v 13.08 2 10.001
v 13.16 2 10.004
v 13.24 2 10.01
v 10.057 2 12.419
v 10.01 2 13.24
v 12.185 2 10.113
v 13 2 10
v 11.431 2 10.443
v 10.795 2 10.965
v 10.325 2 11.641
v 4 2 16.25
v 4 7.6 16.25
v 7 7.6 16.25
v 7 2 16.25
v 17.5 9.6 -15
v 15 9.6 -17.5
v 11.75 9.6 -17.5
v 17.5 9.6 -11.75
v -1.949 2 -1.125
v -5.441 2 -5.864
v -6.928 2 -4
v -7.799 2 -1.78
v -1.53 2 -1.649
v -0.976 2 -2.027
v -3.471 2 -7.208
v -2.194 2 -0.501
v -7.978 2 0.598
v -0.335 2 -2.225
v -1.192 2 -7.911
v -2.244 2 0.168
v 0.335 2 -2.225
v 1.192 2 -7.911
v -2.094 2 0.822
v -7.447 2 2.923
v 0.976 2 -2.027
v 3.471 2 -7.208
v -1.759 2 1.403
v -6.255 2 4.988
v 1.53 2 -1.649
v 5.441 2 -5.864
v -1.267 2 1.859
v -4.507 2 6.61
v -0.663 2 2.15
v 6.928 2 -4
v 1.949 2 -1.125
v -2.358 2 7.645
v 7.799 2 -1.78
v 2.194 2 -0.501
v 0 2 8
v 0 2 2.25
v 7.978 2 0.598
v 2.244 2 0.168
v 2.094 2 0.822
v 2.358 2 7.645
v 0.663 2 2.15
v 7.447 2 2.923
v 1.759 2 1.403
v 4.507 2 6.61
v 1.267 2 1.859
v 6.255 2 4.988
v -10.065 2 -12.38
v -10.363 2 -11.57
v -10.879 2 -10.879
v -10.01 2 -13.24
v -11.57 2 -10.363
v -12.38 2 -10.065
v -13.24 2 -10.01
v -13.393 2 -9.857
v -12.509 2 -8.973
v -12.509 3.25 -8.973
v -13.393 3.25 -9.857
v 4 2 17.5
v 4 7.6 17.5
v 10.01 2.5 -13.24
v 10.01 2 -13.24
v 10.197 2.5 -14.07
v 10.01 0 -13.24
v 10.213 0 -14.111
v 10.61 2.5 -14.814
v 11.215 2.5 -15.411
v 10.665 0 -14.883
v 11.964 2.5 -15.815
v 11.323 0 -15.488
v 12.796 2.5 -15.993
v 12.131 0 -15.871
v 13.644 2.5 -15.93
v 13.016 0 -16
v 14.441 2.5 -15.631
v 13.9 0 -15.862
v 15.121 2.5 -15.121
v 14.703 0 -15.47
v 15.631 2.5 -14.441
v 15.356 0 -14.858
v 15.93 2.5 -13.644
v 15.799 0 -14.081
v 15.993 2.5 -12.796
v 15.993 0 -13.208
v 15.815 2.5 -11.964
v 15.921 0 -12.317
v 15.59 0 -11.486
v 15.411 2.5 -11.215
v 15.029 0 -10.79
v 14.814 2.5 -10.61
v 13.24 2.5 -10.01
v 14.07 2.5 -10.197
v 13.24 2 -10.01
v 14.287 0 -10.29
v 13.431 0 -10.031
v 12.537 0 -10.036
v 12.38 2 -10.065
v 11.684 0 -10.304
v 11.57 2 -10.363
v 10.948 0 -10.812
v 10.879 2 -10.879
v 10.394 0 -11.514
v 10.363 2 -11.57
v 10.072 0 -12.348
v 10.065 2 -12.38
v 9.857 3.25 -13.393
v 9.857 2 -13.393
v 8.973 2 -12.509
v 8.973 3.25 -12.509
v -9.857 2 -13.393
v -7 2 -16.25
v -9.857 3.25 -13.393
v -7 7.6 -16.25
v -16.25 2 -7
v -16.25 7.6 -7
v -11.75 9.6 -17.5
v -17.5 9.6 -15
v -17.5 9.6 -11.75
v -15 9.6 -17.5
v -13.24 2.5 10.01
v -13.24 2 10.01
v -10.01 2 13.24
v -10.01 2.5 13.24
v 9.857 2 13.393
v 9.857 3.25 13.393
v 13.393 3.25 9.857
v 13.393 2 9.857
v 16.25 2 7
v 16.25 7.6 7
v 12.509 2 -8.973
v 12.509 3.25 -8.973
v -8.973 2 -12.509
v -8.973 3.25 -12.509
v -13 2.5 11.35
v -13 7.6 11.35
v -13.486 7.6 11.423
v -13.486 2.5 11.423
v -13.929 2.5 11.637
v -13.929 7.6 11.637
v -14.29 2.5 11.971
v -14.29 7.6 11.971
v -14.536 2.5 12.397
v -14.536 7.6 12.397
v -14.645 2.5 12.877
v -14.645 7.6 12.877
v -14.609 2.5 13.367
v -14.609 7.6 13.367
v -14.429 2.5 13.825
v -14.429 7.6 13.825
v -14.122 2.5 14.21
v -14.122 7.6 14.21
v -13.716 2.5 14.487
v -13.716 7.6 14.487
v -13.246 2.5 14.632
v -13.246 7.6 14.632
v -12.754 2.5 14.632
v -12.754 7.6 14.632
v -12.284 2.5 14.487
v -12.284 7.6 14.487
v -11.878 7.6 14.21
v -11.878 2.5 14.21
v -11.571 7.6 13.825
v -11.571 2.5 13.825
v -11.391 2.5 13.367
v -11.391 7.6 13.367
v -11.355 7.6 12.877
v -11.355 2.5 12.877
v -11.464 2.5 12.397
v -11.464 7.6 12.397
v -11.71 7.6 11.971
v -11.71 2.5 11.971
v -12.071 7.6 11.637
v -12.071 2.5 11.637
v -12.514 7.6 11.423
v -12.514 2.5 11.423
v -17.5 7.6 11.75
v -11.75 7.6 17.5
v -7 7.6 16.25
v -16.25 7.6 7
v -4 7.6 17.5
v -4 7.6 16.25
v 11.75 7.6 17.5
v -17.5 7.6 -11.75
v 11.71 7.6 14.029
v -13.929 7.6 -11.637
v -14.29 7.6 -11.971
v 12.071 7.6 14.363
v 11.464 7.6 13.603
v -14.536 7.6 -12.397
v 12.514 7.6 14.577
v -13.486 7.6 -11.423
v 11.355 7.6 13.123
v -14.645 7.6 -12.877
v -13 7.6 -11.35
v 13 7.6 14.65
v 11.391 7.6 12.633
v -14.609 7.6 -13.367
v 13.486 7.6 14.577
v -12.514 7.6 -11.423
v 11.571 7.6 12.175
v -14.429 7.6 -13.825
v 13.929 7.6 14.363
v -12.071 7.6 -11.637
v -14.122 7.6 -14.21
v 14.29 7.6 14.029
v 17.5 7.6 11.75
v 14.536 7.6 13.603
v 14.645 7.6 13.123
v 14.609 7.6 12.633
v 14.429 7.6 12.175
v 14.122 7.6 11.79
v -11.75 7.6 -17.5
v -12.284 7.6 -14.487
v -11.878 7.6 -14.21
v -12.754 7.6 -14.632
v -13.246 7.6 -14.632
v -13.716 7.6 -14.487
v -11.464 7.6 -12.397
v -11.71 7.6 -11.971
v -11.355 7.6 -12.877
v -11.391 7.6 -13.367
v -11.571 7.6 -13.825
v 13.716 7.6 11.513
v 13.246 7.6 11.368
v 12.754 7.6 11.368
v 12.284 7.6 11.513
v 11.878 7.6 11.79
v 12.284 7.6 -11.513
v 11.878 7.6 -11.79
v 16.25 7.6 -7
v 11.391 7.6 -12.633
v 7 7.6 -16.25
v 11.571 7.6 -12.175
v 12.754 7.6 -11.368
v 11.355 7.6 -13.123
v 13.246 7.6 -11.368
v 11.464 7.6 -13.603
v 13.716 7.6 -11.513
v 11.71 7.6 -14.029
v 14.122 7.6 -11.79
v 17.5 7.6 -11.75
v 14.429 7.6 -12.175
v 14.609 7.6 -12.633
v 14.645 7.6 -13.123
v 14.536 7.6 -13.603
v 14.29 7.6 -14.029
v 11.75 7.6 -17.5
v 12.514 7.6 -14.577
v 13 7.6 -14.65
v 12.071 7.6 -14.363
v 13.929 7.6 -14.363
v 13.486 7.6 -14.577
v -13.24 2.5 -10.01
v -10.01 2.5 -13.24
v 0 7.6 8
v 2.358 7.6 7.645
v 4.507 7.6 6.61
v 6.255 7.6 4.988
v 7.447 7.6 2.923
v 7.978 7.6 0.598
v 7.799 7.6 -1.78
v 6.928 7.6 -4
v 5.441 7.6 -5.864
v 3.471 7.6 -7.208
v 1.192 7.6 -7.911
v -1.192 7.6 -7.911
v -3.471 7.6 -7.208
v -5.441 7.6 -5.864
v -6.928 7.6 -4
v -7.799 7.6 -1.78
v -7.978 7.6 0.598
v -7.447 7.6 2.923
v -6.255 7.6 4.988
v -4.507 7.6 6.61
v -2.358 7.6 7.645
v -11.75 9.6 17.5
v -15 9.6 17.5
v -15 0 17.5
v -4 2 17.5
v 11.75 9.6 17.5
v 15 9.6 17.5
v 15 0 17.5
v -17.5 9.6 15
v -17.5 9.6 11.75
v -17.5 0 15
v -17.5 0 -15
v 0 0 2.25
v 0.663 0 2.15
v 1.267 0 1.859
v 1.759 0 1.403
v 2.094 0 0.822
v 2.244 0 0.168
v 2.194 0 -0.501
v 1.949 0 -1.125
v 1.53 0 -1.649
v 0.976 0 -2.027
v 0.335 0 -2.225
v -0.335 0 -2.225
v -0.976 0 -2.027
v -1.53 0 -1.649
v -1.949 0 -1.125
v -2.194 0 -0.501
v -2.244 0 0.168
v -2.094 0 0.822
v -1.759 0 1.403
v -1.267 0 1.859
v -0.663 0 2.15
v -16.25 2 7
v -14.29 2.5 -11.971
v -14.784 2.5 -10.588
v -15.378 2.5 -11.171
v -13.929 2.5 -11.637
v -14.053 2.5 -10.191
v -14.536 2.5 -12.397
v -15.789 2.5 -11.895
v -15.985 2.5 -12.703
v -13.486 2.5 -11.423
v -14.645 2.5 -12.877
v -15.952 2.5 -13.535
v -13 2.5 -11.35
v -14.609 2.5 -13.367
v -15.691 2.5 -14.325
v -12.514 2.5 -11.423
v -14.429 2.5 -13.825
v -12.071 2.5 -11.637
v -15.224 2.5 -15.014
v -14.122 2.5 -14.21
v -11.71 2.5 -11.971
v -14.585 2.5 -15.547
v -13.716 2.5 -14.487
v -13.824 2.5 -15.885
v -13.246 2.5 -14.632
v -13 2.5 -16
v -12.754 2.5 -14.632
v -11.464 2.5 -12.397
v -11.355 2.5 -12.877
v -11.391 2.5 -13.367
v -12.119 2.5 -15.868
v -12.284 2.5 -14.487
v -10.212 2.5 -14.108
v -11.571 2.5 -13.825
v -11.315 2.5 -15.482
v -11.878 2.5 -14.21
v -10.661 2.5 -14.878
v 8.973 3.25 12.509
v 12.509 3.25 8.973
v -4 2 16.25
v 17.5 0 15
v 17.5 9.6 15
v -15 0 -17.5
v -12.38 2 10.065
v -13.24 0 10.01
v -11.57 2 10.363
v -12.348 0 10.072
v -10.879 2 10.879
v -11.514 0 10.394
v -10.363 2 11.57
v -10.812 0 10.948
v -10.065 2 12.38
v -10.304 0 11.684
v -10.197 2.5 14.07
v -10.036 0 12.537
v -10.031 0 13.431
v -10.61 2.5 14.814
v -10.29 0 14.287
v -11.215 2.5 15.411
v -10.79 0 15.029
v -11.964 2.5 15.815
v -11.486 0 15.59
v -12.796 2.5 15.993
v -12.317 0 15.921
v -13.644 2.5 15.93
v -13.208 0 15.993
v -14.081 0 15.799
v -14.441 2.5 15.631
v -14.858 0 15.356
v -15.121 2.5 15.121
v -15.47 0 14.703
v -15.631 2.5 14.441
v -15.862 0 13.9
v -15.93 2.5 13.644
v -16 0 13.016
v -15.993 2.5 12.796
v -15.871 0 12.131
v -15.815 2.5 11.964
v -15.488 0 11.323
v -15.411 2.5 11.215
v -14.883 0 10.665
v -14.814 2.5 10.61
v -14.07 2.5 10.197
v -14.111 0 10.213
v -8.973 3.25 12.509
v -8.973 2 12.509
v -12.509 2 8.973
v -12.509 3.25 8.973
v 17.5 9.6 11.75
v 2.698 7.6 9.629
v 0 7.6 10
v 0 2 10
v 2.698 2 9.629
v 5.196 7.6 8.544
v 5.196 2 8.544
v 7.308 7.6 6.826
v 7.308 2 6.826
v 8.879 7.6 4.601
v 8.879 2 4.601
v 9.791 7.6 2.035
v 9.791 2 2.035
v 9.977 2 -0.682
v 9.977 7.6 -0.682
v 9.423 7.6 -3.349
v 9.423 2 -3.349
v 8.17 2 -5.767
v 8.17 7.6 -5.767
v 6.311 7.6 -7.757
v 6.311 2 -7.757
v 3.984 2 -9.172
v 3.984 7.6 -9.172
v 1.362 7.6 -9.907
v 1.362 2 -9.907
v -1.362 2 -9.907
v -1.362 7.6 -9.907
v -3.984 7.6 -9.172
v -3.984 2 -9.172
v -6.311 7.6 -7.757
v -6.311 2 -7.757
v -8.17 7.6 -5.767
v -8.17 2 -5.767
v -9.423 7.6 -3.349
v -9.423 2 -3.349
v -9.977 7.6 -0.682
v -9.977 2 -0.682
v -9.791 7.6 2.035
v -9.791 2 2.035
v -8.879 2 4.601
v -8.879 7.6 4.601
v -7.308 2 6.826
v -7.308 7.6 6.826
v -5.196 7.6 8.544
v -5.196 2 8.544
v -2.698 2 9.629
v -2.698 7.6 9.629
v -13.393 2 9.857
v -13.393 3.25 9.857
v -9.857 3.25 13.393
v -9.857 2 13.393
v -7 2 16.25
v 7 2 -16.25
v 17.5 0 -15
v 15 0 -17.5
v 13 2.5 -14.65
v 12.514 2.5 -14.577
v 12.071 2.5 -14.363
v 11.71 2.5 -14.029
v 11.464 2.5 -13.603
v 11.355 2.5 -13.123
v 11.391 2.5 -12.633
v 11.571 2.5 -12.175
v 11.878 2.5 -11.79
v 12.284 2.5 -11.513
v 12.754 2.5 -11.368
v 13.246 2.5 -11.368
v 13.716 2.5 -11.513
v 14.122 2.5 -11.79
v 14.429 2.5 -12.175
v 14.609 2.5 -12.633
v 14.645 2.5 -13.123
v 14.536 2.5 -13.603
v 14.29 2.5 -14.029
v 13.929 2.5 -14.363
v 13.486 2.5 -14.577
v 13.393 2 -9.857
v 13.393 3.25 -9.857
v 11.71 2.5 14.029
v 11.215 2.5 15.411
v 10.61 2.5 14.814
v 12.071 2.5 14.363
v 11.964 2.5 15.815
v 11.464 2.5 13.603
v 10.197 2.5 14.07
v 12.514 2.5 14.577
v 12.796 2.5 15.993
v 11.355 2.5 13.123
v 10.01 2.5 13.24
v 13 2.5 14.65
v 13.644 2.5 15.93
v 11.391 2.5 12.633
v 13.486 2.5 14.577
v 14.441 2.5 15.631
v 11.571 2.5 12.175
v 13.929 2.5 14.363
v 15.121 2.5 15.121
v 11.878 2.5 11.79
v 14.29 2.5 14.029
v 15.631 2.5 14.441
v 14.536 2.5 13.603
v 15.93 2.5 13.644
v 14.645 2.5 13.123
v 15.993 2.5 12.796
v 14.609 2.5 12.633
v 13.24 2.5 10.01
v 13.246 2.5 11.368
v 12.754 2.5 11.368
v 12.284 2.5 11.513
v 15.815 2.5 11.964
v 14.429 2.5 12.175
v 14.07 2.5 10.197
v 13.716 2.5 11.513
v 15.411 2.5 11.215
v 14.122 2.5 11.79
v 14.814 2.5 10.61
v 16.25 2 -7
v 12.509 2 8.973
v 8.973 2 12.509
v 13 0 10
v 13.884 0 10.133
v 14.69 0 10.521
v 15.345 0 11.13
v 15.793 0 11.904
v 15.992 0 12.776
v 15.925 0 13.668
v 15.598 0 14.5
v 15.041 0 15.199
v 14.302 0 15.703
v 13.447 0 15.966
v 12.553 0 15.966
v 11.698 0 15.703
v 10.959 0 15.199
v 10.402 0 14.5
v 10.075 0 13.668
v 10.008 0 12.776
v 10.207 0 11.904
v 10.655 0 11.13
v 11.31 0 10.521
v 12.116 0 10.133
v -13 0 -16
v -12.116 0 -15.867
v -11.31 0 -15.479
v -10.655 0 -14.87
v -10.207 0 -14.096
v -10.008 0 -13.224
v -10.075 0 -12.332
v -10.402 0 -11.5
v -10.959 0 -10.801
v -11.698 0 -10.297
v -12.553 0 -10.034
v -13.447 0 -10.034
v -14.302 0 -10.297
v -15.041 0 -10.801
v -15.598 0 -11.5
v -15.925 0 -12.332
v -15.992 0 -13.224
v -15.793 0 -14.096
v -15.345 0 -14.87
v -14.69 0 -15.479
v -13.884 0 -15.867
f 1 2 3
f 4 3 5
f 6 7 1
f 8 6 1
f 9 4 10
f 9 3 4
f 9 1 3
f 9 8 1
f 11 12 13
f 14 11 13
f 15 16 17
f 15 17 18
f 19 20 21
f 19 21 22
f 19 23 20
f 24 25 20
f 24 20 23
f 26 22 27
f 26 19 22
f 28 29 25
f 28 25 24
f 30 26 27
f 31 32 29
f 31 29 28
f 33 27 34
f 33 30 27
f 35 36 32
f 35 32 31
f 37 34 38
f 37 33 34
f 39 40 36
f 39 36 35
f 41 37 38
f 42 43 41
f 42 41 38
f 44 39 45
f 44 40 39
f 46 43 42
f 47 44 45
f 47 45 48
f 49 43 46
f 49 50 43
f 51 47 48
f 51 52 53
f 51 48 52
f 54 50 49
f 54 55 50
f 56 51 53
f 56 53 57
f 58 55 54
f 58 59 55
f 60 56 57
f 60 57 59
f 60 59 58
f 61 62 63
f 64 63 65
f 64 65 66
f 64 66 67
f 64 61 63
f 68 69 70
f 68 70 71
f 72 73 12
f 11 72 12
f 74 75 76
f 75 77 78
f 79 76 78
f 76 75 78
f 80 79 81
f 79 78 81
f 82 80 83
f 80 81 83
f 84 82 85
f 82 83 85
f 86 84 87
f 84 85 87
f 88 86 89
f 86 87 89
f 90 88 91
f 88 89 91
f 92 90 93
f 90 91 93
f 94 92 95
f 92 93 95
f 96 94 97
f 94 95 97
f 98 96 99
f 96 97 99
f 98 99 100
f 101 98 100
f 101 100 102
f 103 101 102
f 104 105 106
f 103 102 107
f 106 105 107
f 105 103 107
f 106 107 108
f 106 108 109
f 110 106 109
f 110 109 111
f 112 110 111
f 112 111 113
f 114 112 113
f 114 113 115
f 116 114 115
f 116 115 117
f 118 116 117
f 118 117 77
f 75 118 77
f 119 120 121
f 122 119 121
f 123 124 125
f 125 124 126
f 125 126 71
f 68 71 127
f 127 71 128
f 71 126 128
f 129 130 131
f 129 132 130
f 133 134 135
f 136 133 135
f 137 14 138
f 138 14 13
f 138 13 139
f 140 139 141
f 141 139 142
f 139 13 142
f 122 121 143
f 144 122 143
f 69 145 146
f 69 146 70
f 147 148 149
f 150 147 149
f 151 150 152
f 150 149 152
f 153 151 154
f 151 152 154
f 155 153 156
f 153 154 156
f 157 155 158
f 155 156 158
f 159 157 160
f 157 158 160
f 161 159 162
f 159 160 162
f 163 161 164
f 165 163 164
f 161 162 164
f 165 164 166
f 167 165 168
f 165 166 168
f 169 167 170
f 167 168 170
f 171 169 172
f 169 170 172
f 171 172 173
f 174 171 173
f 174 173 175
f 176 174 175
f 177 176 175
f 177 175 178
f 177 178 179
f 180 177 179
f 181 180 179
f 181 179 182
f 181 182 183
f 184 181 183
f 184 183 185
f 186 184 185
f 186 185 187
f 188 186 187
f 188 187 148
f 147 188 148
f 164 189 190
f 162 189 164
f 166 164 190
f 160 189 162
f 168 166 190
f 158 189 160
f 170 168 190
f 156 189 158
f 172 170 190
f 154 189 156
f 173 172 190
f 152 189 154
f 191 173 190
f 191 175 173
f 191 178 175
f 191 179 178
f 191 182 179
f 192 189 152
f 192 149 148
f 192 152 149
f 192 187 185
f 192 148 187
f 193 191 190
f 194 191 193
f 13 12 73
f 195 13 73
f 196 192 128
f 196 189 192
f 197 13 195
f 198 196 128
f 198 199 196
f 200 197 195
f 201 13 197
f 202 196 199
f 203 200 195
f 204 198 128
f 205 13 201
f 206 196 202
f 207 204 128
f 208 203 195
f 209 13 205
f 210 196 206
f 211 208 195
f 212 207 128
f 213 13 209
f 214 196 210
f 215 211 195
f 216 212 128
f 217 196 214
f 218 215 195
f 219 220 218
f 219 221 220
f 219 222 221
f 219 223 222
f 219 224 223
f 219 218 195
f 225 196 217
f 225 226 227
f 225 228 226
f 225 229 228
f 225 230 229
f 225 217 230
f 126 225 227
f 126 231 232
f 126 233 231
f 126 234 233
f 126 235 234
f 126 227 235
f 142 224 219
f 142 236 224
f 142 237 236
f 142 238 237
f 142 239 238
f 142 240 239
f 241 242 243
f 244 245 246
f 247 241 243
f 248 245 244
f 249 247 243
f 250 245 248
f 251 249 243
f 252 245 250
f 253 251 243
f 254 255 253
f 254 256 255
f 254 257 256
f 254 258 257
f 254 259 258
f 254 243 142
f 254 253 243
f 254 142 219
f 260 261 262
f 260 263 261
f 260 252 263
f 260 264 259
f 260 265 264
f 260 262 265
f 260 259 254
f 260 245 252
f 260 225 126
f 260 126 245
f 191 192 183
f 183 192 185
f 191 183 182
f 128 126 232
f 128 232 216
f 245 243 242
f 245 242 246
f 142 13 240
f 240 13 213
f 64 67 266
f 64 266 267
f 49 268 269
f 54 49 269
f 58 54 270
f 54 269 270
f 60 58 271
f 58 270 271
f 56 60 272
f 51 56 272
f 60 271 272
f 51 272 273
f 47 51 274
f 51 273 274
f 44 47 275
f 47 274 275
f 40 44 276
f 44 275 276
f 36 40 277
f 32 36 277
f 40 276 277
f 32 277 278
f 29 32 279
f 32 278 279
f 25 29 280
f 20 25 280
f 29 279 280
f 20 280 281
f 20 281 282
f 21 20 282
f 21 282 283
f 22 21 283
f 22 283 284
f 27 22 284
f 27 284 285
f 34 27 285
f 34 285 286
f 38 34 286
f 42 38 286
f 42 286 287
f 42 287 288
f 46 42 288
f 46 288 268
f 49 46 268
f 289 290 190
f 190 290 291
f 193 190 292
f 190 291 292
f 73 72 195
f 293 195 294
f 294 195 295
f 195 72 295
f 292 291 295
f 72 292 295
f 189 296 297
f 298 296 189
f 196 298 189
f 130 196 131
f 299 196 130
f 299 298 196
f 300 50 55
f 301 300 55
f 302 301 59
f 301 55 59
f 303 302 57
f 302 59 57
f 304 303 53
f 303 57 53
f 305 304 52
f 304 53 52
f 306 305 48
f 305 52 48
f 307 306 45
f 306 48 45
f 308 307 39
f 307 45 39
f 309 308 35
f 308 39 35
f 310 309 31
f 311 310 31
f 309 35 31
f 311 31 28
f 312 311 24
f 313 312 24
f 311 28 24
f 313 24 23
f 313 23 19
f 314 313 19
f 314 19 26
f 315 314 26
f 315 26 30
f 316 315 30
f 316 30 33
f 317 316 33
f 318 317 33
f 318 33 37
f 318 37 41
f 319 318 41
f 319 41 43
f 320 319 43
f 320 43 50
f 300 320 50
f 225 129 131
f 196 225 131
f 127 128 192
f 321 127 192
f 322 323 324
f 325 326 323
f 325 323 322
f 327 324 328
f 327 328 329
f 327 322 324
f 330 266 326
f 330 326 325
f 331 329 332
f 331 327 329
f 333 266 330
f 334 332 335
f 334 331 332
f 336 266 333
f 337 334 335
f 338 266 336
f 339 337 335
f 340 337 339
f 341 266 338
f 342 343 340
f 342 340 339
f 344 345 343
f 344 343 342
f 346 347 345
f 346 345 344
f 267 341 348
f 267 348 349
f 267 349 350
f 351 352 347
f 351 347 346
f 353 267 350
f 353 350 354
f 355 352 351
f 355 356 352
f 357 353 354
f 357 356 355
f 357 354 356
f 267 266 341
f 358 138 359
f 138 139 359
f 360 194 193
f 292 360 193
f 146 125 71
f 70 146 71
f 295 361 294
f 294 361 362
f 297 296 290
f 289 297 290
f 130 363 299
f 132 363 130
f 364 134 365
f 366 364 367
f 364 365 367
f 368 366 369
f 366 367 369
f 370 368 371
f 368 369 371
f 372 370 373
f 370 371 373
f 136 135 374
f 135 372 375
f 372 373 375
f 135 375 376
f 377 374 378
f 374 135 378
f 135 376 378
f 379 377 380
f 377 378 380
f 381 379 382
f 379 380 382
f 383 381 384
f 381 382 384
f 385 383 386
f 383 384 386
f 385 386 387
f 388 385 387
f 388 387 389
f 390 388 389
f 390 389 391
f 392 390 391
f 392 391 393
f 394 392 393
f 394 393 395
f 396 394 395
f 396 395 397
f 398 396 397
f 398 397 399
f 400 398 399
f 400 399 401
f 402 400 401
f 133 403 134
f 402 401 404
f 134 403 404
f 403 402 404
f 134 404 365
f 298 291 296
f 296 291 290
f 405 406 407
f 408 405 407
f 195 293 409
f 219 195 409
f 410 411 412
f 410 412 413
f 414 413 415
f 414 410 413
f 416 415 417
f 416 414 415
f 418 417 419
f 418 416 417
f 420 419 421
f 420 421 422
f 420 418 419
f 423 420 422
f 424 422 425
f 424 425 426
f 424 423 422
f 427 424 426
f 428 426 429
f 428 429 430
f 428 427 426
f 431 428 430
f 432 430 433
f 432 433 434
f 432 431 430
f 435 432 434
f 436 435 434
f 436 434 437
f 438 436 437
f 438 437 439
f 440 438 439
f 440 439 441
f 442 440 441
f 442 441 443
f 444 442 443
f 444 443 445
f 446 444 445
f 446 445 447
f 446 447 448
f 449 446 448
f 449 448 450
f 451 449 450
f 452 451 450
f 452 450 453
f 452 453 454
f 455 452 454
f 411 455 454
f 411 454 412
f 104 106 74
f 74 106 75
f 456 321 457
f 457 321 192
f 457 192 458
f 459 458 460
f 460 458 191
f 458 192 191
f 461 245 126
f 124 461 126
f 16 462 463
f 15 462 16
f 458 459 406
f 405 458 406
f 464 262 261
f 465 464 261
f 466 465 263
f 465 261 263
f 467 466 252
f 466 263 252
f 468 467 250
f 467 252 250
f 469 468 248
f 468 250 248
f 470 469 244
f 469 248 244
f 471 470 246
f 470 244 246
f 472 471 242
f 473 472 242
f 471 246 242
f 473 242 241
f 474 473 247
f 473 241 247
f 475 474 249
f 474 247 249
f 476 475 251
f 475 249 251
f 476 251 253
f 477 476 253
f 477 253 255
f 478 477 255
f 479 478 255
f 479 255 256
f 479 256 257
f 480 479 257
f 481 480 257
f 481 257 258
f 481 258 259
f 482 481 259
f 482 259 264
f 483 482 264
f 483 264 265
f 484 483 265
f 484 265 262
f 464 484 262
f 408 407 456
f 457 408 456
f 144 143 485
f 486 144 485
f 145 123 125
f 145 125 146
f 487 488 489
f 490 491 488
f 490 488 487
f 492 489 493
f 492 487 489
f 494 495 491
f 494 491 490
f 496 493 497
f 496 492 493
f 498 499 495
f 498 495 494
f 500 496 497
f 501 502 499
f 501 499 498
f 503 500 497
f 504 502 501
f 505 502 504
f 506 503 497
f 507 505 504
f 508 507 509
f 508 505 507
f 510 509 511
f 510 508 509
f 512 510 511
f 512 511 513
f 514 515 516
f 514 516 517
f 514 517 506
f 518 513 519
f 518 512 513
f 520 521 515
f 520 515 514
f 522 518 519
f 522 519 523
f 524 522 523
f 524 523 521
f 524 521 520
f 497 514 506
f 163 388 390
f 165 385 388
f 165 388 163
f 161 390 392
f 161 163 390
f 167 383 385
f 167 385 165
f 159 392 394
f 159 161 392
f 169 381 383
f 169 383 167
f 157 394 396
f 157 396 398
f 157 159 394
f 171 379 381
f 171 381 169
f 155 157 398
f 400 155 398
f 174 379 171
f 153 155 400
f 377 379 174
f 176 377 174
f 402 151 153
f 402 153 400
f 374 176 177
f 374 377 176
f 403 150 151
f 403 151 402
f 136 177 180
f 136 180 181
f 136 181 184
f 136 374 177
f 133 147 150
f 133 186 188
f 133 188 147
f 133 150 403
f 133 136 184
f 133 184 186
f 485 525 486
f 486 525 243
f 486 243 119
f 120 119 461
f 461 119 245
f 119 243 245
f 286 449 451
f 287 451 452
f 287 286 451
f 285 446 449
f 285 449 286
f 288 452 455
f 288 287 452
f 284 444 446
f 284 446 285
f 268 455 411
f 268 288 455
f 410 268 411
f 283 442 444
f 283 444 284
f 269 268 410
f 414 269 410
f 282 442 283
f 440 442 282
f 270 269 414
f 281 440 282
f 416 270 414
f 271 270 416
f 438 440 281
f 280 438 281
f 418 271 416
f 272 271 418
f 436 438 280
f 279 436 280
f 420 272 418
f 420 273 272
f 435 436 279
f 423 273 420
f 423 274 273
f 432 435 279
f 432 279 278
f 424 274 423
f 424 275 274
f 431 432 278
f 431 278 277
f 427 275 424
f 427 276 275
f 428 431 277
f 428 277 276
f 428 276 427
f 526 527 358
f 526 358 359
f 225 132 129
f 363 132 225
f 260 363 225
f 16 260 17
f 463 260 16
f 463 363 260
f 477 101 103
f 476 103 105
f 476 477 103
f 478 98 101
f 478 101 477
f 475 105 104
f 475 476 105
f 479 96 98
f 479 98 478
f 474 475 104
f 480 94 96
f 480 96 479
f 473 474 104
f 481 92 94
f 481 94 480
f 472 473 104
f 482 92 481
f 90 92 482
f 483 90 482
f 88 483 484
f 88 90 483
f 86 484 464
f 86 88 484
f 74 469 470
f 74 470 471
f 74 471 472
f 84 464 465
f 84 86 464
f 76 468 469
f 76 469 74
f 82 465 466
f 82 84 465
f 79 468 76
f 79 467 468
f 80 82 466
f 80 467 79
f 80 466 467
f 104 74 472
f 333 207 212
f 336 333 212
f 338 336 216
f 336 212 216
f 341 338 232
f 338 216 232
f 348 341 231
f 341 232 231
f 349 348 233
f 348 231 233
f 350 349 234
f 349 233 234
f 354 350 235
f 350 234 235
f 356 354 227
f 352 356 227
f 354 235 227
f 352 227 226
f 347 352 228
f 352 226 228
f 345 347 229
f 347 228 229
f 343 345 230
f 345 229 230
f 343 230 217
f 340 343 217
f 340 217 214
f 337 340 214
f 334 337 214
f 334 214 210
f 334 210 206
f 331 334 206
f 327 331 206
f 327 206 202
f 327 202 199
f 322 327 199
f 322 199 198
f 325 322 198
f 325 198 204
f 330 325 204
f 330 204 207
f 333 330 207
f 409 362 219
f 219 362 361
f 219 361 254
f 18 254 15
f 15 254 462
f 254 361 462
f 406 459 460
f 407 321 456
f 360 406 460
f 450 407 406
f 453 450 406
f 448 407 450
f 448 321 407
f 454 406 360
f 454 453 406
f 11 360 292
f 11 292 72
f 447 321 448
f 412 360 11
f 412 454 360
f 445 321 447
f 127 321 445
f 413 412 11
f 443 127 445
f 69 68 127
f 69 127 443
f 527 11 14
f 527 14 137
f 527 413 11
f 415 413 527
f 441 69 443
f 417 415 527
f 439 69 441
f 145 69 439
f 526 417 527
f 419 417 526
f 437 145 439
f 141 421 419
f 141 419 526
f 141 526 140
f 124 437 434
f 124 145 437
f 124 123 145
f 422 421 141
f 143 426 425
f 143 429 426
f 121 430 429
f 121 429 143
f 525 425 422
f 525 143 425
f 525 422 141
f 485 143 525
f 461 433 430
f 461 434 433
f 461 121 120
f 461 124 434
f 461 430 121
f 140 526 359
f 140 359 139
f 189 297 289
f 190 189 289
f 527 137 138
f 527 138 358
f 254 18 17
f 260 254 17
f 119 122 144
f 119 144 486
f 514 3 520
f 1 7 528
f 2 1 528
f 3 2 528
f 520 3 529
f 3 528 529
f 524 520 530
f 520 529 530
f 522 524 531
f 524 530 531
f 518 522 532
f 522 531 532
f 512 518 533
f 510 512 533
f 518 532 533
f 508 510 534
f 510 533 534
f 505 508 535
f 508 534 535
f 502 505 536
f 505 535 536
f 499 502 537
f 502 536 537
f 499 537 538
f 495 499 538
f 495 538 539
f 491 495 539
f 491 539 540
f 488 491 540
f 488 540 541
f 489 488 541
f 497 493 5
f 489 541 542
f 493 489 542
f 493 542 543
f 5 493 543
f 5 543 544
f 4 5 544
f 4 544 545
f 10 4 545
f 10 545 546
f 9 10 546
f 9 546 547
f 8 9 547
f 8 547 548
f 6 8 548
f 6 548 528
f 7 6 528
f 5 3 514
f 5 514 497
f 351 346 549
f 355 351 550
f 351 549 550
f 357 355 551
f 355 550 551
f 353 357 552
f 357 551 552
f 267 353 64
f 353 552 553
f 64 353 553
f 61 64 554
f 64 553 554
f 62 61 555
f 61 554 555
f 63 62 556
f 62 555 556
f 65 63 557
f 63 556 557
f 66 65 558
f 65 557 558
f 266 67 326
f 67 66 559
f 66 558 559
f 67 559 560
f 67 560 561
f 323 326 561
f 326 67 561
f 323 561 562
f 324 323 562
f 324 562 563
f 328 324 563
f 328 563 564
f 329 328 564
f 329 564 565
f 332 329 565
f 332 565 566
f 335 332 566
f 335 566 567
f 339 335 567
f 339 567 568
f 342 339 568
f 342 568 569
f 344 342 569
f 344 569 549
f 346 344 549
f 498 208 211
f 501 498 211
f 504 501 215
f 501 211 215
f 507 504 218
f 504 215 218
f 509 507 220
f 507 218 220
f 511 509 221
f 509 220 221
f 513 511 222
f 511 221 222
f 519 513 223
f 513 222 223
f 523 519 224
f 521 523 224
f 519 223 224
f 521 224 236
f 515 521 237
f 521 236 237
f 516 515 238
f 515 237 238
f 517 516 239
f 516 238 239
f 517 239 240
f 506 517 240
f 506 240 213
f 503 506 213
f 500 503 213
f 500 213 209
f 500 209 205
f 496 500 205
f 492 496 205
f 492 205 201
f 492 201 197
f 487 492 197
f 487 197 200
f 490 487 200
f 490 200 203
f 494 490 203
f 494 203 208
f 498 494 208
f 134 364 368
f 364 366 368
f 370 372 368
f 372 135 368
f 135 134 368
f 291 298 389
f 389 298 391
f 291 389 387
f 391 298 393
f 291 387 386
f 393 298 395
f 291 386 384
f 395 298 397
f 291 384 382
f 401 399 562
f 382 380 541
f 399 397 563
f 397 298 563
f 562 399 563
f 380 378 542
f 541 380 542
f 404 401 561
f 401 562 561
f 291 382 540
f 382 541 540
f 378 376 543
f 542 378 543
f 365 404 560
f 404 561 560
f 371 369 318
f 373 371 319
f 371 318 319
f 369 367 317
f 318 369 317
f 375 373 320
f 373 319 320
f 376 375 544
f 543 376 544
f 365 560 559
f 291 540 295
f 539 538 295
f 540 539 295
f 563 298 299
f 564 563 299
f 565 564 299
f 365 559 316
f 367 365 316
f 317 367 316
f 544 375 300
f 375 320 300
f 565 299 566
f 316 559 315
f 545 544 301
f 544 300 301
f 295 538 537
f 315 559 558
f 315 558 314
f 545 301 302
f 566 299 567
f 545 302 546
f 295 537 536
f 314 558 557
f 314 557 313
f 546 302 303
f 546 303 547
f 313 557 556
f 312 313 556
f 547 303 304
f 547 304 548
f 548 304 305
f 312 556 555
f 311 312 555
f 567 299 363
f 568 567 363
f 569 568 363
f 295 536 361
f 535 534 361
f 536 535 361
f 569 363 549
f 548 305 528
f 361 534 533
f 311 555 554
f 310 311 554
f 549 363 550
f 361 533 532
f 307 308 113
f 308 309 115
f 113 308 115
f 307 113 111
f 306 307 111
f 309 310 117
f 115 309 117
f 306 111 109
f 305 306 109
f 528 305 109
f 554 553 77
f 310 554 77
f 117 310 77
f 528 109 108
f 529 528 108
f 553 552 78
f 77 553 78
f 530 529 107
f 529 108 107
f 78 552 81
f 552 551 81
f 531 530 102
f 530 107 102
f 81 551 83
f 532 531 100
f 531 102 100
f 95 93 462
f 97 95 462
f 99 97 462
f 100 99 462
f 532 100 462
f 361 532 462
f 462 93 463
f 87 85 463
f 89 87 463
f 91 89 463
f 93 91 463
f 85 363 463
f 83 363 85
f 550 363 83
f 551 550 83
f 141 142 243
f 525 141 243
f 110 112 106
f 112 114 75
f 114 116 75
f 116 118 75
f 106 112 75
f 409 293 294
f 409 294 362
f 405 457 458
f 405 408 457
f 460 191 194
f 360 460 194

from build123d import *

# Parameters (mm, degrees)
SKETCH1_W           = 35
SKETCH1_H           = 35
BOSS_EXTRUDE1_DEPTH = 9.6
SKETCH2_R           = 10
SKETCH2_R_2         = 8
CUT_EXTRUDE1_DEPTH  = 7.6
CUT_EXTRUDE2_DEPTH  = 2
CHAMFER1_SIZE       = 2.5
SKETCH4_R           = 1.65
SKETCH4_R_2         = 2.25
CUT_EXTRUDE3_DEPTH  = 26.889380062
SKETCH5_R           = 3
CUT_EXTRUDE4_DEPTH  = 2.5
BOSS_EXTRUDE3_DEPTH = 1.25


with BuildPart() as part:
    # Sketch1 → Boss-Extrude1 (new body)
    with BuildSketch(Plane(origin=(0, 0, 0), x_dir=(1, 0, 0), z_dir=(0, 1, 0))):
        Rectangle(SKETCH1_W, SKETCH1_H)
    extrude(amount=BOSS_EXTRUDE1_DEPTH)

    # Sketch2 → Cut-Extrude1 (cut)
    # profile 1 of 2: a face of its own
    with BuildSketch(Plane(origin=(0, 9.6, 0), x_dir=(1, 0, 0), z_dir=(0, 1, 0))):
        Polygon((16.25, 7), (7, 16.25), (-7, 16.25), (-16.25, 7), (-16.25, -7), (-7, -16.25), (-4, -16.25), (-4, -17.5), (4, -17.5), (4, -16.25), (7, -16.25), (16.25, -7), align=None)
        with Locations(Location((0, 0, 0), (0, 0, 270))):
            Circle(SKETCH2_R, mode=Mode.SUBTRACT)
    # profile 2 of 2: a face of its own
    with BuildSketch(Plane(origin=(0, 9.6, 0), x_dir=(1, 0, 0), z_dir=(0, 1, 0))):
        with Locations(Location((0, 0, 0), (0, 0, 270))):
            Circle(SKETCH2_R_2)
    extrude(amount=-CUT_EXTRUDE1_DEPTH, mode=Mode.SUBTRACT)

    # Sketch3 → Cut-Extrude2 (cut)
    with BuildSketch(Plane(origin=(0, 9.6, 0), x_dir=(1, 0, 0), z_dir=(0, 1, 0))):
        Polygon((11.75, 17.5), (-11.75, 17.5), (-17.5, 11.75), (-17.5, -11.75), (-11.75, -17.5), (11.75, -17.5), (17.5, -11.75), (17.5, 11.75), align=None)
    extrude(amount=-CUT_EXTRUDE2_DEPTH, mode=Mode.SUBTRACT)

    # Chamfer1
    chamfer1_edges = [part.edges().sort_by_distance(p)[0] for p in [
        (17.5, 4.8, 17.5),
        (-17.5, 4.8, 17.5),
        (-17.5, 4.8, -17.5),
        (17.5, 4.8, -17.5),
    ]]
    chamfer(chamfer1_edges, length=CHAMFER1_SIZE)

    # Sketch4 → Cut-Extrude3 (cut, through all)
    with BuildSketch(Plane(origin=(0, 7.6, 0), x_dir=(1, 0, 0), z_dir=(0, 1, 0))):
        with Locations(Location((-13, 13, 0), (0, 0, 270))):
            Circle(SKETCH4_R)
        with Locations(Location((13, 13, 0), (0, 0, 90))):
            Circle(SKETCH4_R)
        with Locations(Location((13, -13, 0), (0, 0, 270))):
            Circle(SKETCH4_R)
        with Locations(Location((-13, -13, 0), (0, 0, 90))):
            Circle(SKETCH4_R)
        with Locations(Location((0, 0, 0), (0, 0, 270))):
            Circle(SKETCH4_R_2)
    extrude(amount=-CUT_EXTRUDE3_DEPTH, mode=Mode.SUBTRACT)

    # Sketch5 → Cut-Extrude4 (cut)
    with BuildSketch(Plane.XZ):
        with Locations(Location((13, 13, 0), (0, 0, 270))):
            Circle(SKETCH5_R)
        with Locations(Location((13, -13, 0), (0, 0, 184.59538669))):
            Circle(SKETCH5_R)
        with Locations(Location((-13, -13, 0), (0, 0, 270))):
            Circle(SKETCH5_R)
        with Locations(Location((-13, 13, 0), (0, 0, 265.40461331))):
            Circle(SKETCH5_R)
    extrude(amount=-CUT_EXTRUDE4_DEPTH, mode=Mode.SUBTRACT)

    # Sketch6 → Boss-Extrude3 (add)
    with BuildSketch(Plane(origin=(0, 2, 0), x_dir=(1, 0, 0), z_dir=(0, 1, 0))):
        Polygon((13.392766953, 9.857233047), (9.857233047, 13.392766953), (8.973349571, 12.508883476), (12.508883476, 8.973349571), align=None)
        Polygon((9.857233047, -13.392766953), (8.973349571, -12.508883476), (12.508883476, -8.973349571), (13.392766953, -9.857233047), align=None)
        Polygon((-13.392766953, -9.857233047), (-9.857233047, -13.392766953), (-8.973349571, -12.508883476), (-12.508883476, -8.973349571), align=None)
        Polygon((-9.857233047, 13.392766953), (-8.973349571, 12.508883476), (-12.508883476, 8.973349571), (-13.392766953, 9.857233047), align=None)
    extrude(amount=BOSS_EXTRUDE3_DEPTH)


solid = part.part
